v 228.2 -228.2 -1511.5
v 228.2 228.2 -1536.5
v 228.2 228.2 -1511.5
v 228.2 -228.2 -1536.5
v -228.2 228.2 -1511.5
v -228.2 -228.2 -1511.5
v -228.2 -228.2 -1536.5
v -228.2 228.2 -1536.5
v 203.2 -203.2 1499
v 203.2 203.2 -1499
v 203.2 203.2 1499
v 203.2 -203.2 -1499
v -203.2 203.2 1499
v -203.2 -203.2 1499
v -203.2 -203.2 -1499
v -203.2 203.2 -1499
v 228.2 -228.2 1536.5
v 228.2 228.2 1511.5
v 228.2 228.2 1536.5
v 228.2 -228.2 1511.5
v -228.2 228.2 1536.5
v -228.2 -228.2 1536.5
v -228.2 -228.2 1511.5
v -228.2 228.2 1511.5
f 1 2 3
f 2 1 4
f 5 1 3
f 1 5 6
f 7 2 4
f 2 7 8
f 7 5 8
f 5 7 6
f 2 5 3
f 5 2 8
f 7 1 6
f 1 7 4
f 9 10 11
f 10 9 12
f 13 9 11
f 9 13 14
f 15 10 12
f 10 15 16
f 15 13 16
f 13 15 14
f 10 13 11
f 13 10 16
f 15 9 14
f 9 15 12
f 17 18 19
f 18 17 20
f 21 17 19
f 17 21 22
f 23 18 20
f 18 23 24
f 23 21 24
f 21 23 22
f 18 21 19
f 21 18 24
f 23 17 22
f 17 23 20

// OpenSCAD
// Structural concrete column. Square or round, configurable size +
// height. Local origin = column geometric center (matches the
// connector-graph convention; see authoring README rule 2).
//
// Defaults: 16" square × 10' tall reinforced-concrete column,
// chamfered top + base for a real-building look.
//
// Structural obstruction — no pipe connection, so no @port.

// @part column
// @kind structural
// @category arch.column
// @display-name "Concrete Column 16\" × 10'"
// @mfg other
// @mfg-pn COL-16SQ-10
// @price-usd 860.00
// @install-minutes 60
// @crew foreman
// @param size_in enum[12,14,16,18,20] default=16 label="Size" unit="in"
// @param height_ft number[8,14] default=10 label="Height" unit="ft"

size_in = 16;        // 12, 14, 16, 18, 20 — typical residential / commercial
height_ft = 10;      // 8 - 14 ft typical
shape = "square";    // "square" or "round"

mm_per_in = 25.4;
mm_per_ft = mm_per_in * 12;

w_mm = size_in * mm_per_in;
h_mm = height_ft * mm_per_ft;
chamfer_mm = 25;     // 1 inch chamfer top + bottom

module square_column() {
    // Base flare
    translate([0, 0, -h_mm / 2]) cube(size = [w_mm + 2 * chamfer_mm, w_mm + 2 * chamfer_mm, chamfer_mm], center = true);
    // Shaft
    translate([0, 0, 0]) cube(size = [w_mm, w_mm, h_mm - 2 * chamfer_mm], center = true);
    // Cap
    translate([0, 0, h_mm / 2]) cube(size = [w_mm + 2 * chamfer_mm, w_mm + 2 * chamfer_mm, chamfer_mm], center = true);
}

module round_column() {
    r = w_mm / 2;
    translate([0, 0, -h_mm / 2]) cylinder(h = chamfer_mm, r1 = r + chamfer_mm, r2 = r, center = true, $fn = 48);
    translate([0, 0, 0]) cylinder(h = h_mm - 2 * chamfer_mm, r = r, center = true, $fn = 48);
    translate([0, 0, h_mm / 2]) cylinder(h = chamfer_mm, r1 = r, r2 = r + chamfer_mm, center = true, $fn = 48);
}

if (shape == "round") {
    round_column();
} else {
    square_column();
}
